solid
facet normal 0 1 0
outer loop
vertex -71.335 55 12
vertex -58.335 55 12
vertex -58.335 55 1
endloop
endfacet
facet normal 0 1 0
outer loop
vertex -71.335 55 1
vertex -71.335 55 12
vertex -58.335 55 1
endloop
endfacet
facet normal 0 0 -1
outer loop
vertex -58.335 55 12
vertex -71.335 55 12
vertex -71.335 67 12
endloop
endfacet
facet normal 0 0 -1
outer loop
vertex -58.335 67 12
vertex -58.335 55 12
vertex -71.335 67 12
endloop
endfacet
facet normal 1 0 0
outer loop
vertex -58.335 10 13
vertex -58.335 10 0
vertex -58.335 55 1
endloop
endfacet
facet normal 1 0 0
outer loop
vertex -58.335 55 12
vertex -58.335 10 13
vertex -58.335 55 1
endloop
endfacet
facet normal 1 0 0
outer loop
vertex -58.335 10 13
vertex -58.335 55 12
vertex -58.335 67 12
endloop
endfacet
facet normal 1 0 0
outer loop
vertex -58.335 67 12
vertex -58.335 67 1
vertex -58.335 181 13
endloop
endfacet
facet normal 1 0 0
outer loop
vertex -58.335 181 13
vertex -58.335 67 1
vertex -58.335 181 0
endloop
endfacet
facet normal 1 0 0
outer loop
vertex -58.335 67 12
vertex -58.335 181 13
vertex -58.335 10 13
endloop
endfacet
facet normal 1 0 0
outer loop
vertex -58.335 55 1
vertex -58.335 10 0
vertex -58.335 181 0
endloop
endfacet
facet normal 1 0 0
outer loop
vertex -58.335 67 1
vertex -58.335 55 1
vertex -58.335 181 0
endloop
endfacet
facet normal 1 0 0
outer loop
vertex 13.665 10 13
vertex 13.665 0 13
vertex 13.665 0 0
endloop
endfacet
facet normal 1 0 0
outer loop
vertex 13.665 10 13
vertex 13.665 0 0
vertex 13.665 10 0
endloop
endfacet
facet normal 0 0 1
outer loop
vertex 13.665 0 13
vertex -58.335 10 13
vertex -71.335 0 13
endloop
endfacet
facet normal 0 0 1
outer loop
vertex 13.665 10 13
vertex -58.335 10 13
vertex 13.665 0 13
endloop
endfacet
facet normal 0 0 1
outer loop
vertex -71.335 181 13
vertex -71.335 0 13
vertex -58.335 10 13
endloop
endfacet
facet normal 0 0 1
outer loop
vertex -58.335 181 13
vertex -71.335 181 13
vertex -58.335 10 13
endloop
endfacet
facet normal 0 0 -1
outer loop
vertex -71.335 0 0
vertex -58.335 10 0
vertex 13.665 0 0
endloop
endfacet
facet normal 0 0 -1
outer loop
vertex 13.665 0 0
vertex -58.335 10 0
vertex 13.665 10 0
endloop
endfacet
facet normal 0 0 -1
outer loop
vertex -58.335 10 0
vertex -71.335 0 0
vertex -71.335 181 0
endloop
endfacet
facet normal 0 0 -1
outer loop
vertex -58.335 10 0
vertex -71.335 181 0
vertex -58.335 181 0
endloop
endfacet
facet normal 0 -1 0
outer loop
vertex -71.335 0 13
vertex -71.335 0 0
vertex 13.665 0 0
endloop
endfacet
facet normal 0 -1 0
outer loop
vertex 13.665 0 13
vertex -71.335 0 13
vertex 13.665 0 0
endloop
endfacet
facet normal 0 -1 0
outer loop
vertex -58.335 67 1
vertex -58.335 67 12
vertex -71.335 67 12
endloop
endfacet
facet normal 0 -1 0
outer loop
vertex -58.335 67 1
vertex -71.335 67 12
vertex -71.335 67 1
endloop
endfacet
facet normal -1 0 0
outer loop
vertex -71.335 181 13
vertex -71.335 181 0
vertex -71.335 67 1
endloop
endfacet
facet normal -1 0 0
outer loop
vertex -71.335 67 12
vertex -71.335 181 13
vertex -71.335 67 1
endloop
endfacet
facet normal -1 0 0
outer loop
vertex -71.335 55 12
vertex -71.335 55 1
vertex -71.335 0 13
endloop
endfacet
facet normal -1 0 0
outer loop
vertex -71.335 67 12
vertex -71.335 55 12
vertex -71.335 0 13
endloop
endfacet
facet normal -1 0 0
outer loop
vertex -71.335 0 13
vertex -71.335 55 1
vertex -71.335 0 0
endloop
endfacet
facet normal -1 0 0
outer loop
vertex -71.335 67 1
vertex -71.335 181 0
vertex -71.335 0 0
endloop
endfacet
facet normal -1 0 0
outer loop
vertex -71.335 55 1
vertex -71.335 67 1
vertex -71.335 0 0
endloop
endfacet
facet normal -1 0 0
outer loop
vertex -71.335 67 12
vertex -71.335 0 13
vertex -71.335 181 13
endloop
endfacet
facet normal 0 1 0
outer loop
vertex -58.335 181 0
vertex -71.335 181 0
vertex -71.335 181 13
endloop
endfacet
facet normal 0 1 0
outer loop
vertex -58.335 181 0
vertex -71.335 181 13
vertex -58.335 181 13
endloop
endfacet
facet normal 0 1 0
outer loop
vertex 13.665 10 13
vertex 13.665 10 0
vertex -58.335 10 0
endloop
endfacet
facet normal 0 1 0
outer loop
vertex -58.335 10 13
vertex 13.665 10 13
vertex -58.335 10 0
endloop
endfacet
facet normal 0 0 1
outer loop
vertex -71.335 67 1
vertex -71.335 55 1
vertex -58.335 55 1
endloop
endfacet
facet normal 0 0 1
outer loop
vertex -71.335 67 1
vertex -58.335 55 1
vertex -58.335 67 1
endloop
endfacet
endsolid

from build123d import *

# Parameters (mm, degrees)
ESQUISSE2_W             = 13
ESQUISSE2_H             = 171
BOSS_EXTRU_1_DEPTH      = 13
BOSS_EXTRU_2_DEPTH      = 13
ESQUISSE4_W             = 11
ESQUISSE4_H             = 12
ENL_V_MAT_EXTRU_2_DEPTH = 37


with BuildPart() as part:
    # Esquisse2 → Boss.-Extru.1 (new body)
    with BuildSketch(Plane.XY):
        with Locations((-64.835362299, 95.5)):
            Rectangle(ESQUISSE2_W, ESQUISSE2_H)
    extrude(amount=BOSS_EXTRU_1_DEPTH)

    # Esquisse2<3> → Boss.-Extru.2 (add)
    with BuildSketch(Plane.XY):
        Polygon((-58.335362299, 10), (-71.335362299, 10), (-71.335362299, 0), (13.664637701, 0), (13.664637701, 10), align=None)
    extrude(amount=BOSS_EXTRU_2_DEPTH)

    # Esquisse4 → Enlèv. mat.-Extru.2 (cut)
    with BuildSketch(Plane(origin=(-58.335362299, 0, 0), x_dir=(0, 0, -1), z_dir=(1, 0, 0))):
        with Locations((-6.5, 61)):
            Rectangle(ESQUISSE4_W, ESQUISSE4_H)
    extrude(amount=-ENL_V_MAT_EXTRU_2_DEPTH, mode=Mode.SUBTRACT)


solid = part.part
